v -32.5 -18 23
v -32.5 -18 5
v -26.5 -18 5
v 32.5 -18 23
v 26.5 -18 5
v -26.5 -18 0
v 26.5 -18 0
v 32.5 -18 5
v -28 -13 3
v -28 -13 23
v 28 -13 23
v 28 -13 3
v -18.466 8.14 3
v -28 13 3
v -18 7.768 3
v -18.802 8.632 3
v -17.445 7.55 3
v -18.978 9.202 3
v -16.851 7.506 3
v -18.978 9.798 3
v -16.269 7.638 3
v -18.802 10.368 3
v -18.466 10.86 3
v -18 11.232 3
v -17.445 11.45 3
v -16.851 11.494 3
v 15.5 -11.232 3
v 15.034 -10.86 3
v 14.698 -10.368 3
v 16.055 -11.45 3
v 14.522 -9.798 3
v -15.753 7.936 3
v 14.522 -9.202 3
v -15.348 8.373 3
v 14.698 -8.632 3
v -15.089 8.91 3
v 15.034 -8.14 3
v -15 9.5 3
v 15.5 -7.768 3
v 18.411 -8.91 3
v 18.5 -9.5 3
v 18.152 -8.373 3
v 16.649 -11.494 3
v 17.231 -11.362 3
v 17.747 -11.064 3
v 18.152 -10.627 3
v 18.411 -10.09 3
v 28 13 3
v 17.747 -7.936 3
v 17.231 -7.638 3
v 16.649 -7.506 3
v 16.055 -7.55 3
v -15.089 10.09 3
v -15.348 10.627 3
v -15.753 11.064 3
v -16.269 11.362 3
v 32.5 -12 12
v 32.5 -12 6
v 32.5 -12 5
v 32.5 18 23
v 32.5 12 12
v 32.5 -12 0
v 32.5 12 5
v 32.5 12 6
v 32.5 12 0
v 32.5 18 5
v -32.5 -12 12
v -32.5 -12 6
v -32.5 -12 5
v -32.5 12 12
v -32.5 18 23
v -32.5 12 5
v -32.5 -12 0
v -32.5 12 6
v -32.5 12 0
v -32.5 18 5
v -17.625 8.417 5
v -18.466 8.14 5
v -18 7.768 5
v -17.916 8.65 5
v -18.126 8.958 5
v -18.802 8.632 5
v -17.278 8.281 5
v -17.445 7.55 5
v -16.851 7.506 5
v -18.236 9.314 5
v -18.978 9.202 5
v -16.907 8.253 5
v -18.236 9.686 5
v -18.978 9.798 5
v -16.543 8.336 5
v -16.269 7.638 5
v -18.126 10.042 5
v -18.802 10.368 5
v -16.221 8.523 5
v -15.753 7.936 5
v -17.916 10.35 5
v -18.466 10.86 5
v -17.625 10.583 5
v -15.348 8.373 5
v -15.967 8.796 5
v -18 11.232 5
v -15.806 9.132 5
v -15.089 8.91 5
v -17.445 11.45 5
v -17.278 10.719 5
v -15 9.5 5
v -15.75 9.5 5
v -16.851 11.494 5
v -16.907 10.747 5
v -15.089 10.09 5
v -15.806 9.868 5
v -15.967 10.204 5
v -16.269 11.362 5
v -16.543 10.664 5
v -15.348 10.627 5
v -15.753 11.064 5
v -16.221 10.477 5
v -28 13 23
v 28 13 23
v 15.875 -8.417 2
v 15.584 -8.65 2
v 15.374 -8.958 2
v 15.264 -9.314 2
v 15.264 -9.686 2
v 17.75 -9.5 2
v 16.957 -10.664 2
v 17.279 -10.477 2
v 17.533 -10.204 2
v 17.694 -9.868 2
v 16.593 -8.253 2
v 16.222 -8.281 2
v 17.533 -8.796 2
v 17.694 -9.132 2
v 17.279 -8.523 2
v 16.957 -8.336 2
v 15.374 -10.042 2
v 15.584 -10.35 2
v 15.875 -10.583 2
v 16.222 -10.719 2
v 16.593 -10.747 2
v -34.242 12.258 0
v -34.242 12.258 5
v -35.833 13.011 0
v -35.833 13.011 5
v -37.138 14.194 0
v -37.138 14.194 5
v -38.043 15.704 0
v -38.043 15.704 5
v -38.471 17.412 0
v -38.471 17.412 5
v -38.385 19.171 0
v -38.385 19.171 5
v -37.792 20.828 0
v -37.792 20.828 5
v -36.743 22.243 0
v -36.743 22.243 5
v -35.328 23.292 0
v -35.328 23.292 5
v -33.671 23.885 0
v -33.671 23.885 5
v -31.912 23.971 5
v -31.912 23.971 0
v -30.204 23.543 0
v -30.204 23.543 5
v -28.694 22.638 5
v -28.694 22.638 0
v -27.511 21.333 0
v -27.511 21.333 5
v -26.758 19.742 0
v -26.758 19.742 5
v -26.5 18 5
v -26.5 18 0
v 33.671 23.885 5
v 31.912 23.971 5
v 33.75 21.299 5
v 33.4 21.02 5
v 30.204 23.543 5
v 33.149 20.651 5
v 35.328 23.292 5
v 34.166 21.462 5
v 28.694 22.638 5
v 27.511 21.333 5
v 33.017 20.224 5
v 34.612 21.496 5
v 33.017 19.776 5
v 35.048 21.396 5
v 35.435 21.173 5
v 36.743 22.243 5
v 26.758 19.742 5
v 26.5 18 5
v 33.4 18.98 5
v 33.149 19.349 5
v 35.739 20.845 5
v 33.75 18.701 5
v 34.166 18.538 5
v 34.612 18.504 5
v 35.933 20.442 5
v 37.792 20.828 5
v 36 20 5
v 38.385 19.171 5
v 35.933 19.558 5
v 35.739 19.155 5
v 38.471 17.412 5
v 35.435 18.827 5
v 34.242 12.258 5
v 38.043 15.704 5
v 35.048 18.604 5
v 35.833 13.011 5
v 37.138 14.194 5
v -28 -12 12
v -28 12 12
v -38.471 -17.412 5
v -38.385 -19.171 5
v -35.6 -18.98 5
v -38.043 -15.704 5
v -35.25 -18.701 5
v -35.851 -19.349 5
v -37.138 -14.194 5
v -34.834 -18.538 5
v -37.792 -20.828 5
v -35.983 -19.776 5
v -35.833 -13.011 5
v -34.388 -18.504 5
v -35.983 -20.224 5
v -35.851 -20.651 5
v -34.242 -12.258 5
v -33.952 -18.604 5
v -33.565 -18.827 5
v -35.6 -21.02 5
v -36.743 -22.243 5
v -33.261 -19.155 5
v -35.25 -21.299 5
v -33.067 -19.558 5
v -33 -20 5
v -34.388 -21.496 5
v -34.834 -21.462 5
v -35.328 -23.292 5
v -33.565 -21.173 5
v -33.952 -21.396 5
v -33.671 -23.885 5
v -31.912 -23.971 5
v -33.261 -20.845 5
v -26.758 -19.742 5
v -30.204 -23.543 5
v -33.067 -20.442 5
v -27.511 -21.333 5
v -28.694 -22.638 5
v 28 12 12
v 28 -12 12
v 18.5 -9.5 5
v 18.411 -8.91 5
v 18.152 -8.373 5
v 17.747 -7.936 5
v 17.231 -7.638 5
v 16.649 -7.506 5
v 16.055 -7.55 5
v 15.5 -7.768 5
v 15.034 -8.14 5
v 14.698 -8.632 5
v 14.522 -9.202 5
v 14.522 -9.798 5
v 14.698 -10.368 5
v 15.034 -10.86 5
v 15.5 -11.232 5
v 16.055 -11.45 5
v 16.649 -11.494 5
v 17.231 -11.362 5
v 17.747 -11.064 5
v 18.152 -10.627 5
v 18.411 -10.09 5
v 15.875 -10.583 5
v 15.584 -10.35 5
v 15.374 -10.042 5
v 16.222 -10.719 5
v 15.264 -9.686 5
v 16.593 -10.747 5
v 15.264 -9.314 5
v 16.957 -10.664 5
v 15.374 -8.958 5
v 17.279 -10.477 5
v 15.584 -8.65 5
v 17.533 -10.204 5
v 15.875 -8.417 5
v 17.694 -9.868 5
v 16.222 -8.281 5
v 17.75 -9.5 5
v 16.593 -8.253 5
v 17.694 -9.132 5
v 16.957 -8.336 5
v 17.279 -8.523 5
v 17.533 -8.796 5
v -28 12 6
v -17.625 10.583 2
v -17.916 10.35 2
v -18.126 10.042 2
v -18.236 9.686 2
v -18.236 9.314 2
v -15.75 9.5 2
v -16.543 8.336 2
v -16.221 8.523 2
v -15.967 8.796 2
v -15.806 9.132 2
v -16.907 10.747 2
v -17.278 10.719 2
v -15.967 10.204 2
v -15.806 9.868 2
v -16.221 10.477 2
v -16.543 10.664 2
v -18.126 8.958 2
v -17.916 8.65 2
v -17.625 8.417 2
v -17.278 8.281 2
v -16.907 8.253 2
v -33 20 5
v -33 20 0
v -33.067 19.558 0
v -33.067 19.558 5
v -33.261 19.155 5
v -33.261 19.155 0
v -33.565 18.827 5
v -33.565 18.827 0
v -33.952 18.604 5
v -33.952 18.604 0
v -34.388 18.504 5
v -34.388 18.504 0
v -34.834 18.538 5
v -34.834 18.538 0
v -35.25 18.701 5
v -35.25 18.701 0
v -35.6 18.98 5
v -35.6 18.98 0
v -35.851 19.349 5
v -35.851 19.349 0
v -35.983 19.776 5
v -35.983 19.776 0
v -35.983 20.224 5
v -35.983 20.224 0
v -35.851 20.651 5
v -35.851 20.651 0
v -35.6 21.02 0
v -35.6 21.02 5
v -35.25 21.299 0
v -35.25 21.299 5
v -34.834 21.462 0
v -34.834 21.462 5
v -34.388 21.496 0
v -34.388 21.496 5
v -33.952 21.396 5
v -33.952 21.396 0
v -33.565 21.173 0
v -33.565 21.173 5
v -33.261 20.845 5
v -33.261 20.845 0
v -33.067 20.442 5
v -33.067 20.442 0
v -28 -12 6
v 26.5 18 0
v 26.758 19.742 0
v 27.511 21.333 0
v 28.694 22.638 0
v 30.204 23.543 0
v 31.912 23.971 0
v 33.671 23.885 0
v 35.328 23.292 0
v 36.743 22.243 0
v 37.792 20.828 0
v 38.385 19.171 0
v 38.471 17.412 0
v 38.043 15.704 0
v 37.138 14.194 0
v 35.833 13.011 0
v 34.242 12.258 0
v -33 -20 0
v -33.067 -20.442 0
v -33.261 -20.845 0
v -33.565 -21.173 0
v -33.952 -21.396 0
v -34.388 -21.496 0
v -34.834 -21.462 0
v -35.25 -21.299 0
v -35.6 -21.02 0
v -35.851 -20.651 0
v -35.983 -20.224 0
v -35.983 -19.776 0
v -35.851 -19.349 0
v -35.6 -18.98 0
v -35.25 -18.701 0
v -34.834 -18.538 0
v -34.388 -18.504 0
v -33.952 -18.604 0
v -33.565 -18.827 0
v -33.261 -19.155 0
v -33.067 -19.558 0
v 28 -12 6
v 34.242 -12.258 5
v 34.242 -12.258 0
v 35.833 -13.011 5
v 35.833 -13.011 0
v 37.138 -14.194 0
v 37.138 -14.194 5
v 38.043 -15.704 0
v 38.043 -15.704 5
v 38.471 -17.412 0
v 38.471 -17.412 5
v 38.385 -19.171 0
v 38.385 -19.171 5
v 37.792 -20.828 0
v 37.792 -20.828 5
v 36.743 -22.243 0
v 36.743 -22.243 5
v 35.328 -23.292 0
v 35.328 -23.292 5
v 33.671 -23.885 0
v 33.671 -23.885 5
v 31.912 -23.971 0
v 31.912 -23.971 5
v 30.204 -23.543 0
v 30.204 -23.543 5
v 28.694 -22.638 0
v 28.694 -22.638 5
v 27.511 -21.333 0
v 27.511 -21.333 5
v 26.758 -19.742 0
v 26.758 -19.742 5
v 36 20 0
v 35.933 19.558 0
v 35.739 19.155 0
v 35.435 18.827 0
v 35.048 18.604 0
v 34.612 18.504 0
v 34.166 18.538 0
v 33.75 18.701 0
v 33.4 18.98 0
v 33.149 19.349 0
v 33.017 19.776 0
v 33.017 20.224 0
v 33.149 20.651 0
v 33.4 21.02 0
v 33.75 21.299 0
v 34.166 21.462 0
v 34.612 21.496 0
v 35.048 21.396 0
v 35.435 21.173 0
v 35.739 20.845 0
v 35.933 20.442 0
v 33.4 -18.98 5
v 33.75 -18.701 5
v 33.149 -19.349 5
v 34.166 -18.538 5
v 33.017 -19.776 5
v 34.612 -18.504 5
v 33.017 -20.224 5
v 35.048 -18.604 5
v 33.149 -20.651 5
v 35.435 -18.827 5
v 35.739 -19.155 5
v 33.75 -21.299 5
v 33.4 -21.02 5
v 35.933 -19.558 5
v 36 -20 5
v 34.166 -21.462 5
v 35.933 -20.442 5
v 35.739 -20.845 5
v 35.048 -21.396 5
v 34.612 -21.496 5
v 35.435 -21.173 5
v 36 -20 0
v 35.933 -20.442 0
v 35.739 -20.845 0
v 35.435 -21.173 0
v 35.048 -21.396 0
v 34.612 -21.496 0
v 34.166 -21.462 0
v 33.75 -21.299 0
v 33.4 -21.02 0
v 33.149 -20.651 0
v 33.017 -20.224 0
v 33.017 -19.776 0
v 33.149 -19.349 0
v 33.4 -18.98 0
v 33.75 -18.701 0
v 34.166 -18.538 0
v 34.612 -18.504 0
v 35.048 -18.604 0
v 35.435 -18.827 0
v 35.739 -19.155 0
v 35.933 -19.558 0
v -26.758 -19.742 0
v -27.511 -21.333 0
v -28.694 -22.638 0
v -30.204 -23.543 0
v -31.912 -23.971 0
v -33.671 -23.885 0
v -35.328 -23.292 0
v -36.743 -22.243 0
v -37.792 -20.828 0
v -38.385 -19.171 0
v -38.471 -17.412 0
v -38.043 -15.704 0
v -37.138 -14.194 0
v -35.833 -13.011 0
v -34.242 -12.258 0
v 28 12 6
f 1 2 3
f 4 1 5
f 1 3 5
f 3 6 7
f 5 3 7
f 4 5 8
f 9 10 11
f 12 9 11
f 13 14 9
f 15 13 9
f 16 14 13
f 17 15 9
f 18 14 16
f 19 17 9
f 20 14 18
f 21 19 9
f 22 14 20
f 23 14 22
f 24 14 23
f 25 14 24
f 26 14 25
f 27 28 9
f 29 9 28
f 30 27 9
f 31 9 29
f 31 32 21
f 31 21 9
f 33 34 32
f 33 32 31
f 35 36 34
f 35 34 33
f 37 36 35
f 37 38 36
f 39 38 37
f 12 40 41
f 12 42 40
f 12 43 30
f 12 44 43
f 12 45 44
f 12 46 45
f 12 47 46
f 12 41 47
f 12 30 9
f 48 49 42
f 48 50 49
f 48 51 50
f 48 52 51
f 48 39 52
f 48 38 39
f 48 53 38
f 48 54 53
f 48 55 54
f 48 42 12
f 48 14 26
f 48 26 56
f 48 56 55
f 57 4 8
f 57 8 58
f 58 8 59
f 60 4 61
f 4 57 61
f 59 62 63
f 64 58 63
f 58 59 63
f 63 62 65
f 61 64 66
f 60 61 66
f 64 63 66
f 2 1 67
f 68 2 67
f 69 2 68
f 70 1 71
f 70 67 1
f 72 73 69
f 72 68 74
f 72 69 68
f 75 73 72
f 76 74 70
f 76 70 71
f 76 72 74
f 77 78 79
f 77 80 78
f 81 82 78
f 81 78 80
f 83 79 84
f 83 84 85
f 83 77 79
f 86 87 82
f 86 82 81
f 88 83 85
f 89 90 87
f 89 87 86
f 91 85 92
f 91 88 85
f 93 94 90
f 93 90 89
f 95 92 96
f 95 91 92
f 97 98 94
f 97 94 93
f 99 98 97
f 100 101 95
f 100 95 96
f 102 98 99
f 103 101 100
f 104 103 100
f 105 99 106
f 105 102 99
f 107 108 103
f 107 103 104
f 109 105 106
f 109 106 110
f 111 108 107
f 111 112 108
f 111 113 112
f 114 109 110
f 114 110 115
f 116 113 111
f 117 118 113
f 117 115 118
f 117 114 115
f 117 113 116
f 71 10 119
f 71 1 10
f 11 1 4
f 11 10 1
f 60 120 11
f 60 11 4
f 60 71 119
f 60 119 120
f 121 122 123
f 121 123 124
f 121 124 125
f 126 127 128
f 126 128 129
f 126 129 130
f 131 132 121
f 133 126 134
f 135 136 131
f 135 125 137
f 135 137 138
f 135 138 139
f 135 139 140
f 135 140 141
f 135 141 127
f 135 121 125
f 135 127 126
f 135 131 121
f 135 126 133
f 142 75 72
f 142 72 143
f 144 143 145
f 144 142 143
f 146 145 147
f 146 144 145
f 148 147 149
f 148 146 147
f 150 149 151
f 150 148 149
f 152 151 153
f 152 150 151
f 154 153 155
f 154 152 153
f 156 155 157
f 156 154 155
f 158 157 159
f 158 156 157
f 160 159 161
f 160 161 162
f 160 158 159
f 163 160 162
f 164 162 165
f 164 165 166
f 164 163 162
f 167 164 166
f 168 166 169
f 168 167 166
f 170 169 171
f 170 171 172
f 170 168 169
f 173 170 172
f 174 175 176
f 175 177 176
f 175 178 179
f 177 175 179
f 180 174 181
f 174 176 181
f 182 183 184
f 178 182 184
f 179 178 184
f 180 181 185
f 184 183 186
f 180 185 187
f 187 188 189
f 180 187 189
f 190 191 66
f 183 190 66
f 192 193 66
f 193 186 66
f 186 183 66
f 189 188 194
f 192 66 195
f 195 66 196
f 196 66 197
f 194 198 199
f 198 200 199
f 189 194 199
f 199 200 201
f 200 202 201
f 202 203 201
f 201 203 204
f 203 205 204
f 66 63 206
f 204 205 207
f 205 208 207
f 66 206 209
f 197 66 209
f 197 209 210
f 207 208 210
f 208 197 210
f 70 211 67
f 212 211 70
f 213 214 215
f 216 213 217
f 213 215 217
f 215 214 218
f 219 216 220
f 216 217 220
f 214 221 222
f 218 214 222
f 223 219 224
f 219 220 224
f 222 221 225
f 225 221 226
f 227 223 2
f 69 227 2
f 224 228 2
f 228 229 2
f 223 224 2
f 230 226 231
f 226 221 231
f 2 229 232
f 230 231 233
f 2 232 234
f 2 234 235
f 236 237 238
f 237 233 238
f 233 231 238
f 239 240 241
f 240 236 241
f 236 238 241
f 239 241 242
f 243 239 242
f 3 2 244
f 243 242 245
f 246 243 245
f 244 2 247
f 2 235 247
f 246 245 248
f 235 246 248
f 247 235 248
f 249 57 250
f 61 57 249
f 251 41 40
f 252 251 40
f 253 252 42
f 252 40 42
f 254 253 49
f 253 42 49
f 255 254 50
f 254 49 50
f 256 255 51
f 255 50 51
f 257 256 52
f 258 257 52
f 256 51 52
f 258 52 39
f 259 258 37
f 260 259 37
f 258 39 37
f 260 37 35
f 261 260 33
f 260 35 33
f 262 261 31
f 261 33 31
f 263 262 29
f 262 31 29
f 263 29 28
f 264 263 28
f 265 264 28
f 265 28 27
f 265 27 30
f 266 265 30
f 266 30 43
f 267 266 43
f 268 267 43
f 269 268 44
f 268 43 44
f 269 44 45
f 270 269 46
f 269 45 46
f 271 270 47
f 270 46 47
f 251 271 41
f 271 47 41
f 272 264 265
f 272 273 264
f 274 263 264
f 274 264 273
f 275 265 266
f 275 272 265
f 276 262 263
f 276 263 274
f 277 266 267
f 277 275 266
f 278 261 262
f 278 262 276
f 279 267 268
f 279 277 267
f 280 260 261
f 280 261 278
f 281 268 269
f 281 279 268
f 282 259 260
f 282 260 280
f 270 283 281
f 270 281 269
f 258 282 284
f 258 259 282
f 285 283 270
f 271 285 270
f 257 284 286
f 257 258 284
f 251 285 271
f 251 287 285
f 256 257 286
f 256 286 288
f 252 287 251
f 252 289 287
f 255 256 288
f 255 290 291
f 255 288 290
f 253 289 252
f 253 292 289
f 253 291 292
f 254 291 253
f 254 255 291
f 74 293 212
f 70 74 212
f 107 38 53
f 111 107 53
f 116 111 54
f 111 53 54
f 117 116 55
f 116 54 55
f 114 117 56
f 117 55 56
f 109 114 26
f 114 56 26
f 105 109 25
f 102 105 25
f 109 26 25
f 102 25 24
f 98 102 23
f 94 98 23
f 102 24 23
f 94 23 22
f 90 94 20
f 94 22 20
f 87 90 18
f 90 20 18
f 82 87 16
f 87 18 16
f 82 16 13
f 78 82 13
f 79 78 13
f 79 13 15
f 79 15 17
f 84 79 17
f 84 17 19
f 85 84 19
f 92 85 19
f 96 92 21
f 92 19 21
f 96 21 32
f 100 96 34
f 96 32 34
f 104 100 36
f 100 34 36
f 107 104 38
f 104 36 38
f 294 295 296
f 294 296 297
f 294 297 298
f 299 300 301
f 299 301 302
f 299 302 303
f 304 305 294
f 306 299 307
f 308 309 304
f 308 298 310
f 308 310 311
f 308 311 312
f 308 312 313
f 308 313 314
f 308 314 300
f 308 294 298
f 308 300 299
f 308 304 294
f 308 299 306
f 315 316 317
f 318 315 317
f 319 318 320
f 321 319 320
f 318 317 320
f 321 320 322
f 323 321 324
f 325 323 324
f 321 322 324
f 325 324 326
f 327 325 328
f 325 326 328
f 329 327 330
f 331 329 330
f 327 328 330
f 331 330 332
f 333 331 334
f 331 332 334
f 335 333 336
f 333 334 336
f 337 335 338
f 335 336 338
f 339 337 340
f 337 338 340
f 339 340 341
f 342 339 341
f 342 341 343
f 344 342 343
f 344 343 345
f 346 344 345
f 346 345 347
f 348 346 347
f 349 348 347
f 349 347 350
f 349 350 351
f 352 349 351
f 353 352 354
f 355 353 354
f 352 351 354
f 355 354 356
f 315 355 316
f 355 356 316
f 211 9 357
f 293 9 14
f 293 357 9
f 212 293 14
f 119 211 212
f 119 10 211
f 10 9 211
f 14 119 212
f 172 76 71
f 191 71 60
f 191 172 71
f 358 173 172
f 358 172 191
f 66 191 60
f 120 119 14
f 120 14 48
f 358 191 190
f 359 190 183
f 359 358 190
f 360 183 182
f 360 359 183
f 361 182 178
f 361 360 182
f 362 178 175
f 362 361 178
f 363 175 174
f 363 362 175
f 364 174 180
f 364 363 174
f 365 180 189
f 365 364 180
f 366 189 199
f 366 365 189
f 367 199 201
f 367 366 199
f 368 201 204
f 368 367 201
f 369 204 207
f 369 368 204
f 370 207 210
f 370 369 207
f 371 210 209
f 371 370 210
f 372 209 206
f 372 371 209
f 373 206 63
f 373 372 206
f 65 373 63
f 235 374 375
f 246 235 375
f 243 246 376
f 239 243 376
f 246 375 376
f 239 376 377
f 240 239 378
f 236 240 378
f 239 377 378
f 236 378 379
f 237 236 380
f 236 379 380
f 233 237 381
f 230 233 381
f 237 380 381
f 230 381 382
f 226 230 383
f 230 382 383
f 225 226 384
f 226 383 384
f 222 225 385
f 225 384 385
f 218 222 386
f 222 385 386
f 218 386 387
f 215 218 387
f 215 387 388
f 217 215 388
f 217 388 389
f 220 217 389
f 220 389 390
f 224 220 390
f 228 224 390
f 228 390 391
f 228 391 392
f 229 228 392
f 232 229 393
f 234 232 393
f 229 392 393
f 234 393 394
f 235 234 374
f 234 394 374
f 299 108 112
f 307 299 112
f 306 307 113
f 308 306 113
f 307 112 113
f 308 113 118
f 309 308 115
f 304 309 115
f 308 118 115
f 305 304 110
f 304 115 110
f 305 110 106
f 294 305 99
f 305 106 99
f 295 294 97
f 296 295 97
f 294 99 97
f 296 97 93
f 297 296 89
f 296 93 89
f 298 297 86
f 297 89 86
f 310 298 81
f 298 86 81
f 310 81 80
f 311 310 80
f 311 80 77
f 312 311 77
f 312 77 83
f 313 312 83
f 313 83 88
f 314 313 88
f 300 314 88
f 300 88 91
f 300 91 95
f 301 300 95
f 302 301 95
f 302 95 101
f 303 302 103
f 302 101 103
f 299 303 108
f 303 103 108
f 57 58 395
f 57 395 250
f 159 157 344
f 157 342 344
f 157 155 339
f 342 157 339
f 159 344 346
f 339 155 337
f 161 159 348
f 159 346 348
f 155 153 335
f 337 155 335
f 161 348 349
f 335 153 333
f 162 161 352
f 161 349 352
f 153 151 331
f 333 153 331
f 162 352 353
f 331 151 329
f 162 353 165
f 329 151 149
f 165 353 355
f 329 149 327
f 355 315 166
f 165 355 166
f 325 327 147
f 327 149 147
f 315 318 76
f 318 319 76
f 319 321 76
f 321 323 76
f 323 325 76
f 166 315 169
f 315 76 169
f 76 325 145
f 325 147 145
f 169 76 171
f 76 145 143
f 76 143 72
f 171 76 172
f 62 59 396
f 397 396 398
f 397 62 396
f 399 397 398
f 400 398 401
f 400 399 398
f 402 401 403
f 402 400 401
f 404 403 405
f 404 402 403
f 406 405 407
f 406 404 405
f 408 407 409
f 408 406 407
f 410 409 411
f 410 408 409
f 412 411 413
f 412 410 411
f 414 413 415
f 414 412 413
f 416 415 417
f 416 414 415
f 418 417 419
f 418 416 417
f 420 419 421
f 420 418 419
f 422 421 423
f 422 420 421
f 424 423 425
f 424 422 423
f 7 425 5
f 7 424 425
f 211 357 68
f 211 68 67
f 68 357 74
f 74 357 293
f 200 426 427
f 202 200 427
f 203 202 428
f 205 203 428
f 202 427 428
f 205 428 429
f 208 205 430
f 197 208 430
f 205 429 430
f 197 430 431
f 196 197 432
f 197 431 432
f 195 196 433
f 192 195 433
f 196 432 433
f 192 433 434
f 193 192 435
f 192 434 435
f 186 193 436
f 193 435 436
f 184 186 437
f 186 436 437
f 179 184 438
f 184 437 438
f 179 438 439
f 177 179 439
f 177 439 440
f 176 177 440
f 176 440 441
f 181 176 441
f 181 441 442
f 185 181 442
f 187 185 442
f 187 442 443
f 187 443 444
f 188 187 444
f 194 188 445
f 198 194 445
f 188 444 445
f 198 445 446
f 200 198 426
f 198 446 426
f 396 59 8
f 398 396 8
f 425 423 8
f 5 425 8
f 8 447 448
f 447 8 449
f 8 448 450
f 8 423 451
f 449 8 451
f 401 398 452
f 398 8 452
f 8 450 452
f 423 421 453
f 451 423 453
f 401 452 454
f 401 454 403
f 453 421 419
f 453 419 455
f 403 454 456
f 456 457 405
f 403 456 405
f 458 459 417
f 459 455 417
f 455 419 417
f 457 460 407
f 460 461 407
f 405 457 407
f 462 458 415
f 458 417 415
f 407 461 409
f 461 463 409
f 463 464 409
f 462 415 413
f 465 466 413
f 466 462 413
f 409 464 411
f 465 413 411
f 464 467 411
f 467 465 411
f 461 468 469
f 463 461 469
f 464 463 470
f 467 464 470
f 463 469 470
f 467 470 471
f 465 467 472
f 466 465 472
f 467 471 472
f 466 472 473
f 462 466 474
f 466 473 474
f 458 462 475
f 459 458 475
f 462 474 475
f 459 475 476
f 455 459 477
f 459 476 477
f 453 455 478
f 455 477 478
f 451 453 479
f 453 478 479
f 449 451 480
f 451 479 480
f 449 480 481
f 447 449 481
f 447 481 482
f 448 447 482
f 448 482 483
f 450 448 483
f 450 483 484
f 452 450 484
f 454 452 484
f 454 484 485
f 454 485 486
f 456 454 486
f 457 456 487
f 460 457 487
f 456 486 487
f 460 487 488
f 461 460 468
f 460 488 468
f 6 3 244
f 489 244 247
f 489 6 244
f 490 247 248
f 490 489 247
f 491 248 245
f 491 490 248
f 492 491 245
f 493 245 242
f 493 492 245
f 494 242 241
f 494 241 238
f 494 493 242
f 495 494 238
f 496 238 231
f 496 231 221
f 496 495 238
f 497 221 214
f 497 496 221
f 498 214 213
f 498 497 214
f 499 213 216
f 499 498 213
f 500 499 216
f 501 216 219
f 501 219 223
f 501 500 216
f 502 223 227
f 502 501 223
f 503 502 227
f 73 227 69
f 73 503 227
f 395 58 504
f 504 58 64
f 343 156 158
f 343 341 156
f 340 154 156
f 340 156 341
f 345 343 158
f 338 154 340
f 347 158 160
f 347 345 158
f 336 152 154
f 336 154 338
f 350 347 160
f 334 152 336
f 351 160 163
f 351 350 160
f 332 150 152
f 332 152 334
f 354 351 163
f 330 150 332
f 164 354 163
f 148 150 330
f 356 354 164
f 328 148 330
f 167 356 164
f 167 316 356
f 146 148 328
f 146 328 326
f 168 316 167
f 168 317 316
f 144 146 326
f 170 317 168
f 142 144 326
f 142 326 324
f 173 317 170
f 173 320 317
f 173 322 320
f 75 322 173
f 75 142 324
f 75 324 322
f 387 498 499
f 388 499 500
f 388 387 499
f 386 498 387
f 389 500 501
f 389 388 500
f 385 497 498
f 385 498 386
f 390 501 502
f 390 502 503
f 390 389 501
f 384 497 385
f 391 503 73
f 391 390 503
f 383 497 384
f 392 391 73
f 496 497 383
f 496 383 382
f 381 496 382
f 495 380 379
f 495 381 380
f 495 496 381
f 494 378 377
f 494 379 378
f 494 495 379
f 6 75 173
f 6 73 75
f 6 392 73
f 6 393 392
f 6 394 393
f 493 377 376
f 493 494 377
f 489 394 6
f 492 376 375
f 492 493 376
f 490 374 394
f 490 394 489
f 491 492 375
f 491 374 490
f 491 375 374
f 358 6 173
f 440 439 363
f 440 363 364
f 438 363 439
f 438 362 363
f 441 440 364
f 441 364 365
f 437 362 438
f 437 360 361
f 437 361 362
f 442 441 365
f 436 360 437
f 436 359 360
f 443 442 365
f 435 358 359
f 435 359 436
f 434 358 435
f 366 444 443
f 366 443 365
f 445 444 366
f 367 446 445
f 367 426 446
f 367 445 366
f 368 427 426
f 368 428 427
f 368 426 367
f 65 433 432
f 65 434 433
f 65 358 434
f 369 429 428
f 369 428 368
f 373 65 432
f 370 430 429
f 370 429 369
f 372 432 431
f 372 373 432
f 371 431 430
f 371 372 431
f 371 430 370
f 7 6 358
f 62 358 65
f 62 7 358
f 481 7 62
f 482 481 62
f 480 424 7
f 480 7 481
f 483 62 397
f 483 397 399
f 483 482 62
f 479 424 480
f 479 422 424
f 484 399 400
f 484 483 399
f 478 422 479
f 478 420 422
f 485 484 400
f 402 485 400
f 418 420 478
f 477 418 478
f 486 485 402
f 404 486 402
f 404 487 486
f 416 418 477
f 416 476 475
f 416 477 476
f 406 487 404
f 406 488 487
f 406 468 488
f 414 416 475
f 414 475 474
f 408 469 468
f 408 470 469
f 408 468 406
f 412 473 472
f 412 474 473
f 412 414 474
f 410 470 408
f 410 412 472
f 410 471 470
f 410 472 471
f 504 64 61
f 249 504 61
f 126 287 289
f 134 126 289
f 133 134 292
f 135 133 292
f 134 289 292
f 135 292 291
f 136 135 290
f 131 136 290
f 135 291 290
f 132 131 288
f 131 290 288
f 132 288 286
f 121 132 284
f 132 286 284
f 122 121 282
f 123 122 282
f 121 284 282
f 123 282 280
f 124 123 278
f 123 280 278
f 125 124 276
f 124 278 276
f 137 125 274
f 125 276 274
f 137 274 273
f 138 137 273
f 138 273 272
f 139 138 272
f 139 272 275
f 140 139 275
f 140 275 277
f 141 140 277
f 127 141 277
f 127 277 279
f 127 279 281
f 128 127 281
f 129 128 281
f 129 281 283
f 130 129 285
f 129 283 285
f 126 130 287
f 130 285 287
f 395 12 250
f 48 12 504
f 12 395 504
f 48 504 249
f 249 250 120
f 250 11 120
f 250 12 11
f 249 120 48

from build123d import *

# Parameters (mm, degrees)
F0_W      = 65
F0_H      = 36
F1_DEPTH  = 23
F2_W      = 56
F2_H      = 26
F3_DEPTH  = 20
F4_R      = 2
F5_DEPTH  = 2
F6_R      = 1.25
F7_DEPTH  = 3
F8_R      = 1.25
F9_DEPTH  = 3
F10_R     = 6
F10_R_2   = 1.5
F11_DEPTH = 5
F12_W     = 24
F12_H     = 6
F13_DEPTH = 100


with BuildPart() as f1:
    # F0 (on Top) → F1 (new body)
    with BuildSketch(Plane.XY):
        Rectangle(F0_W, F0_H)
    extrude(amount=F1_DEPTH)

    # F2 (on face) → F3 (cut)
    with BuildSketch(Plane.XY.offset(23)):
        Rectangle(F2_W, F2_H)
    extrude(amount=-F3_DEPTH, mode=Mode.SUBTRACT)

    # F4 (on face) → F5 (join)
    with BuildSketch(Plane.XY.offset(3)):
        with Locations((-17, 9.5)):
            Circle(F4_R)
        with Locations((16.5, -9.5)):
            Circle(F4_R)
    extrude(amount=F5_DEPTH)

    # F6 (on face) → F7 (cut)
    with BuildSketch(Plane.XY.offset(5)):
        with Locations((-17, 9.5)):
            Circle(F6_R)
    extrude(amount=-F7_DEPTH, mode=Mode.SUBTRACT)

    # F8 (on face) → F9 (cut)
    with BuildSketch(Plane.XY.offset(5)):
        with Locations((16.5, -9.5)):
            Circle(F8_R)
    extrude(amount=-F9_DEPTH, mode=Mode.SUBTRACT)

    # F10 (on face) → F11 (join)
    with BuildSketch(Plane(origin=(0, 0, 0), x_dir=(1, 0, 0), z_dir=(0, 0, -1))):
        with Locations((-32.5, 18)):
            Circle(F10_R)
        with Locations((-34.5, 20)):
            Circle(F10_R_2, mode=Mode.SUBTRACT)
        with Locations((32.5, 18)):
            Circle(F10_R)
        with Locations((34.5, 20)):
            Circle(F10_R_2, mode=Mode.SUBTRACT)
        with Locations((32.5, -18)):
            Circle(F10_R)
        with Locations((34.5, -20)):
            Circle(F10_R_2, mode=Mode.SUBTRACT)
        with Locations((-32.5, -18)):
            Circle(F10_R)
        with Locations((-34.5, -20)):
            Circle(F10_R_2, mode=Mode.SUBTRACT)
    extrude(amount=-F11_DEPTH)

    # F12 (on face) → F13 (cut)
    with BuildSketch(Plane.YZ.offset(32.5)):
        with Locations((0, 9)):
            Rectangle(F12_W, F12_H)
    extrude(amount=-F13_DEPTH, mode=Mode.SUBTRACT)


solid = f1.part
